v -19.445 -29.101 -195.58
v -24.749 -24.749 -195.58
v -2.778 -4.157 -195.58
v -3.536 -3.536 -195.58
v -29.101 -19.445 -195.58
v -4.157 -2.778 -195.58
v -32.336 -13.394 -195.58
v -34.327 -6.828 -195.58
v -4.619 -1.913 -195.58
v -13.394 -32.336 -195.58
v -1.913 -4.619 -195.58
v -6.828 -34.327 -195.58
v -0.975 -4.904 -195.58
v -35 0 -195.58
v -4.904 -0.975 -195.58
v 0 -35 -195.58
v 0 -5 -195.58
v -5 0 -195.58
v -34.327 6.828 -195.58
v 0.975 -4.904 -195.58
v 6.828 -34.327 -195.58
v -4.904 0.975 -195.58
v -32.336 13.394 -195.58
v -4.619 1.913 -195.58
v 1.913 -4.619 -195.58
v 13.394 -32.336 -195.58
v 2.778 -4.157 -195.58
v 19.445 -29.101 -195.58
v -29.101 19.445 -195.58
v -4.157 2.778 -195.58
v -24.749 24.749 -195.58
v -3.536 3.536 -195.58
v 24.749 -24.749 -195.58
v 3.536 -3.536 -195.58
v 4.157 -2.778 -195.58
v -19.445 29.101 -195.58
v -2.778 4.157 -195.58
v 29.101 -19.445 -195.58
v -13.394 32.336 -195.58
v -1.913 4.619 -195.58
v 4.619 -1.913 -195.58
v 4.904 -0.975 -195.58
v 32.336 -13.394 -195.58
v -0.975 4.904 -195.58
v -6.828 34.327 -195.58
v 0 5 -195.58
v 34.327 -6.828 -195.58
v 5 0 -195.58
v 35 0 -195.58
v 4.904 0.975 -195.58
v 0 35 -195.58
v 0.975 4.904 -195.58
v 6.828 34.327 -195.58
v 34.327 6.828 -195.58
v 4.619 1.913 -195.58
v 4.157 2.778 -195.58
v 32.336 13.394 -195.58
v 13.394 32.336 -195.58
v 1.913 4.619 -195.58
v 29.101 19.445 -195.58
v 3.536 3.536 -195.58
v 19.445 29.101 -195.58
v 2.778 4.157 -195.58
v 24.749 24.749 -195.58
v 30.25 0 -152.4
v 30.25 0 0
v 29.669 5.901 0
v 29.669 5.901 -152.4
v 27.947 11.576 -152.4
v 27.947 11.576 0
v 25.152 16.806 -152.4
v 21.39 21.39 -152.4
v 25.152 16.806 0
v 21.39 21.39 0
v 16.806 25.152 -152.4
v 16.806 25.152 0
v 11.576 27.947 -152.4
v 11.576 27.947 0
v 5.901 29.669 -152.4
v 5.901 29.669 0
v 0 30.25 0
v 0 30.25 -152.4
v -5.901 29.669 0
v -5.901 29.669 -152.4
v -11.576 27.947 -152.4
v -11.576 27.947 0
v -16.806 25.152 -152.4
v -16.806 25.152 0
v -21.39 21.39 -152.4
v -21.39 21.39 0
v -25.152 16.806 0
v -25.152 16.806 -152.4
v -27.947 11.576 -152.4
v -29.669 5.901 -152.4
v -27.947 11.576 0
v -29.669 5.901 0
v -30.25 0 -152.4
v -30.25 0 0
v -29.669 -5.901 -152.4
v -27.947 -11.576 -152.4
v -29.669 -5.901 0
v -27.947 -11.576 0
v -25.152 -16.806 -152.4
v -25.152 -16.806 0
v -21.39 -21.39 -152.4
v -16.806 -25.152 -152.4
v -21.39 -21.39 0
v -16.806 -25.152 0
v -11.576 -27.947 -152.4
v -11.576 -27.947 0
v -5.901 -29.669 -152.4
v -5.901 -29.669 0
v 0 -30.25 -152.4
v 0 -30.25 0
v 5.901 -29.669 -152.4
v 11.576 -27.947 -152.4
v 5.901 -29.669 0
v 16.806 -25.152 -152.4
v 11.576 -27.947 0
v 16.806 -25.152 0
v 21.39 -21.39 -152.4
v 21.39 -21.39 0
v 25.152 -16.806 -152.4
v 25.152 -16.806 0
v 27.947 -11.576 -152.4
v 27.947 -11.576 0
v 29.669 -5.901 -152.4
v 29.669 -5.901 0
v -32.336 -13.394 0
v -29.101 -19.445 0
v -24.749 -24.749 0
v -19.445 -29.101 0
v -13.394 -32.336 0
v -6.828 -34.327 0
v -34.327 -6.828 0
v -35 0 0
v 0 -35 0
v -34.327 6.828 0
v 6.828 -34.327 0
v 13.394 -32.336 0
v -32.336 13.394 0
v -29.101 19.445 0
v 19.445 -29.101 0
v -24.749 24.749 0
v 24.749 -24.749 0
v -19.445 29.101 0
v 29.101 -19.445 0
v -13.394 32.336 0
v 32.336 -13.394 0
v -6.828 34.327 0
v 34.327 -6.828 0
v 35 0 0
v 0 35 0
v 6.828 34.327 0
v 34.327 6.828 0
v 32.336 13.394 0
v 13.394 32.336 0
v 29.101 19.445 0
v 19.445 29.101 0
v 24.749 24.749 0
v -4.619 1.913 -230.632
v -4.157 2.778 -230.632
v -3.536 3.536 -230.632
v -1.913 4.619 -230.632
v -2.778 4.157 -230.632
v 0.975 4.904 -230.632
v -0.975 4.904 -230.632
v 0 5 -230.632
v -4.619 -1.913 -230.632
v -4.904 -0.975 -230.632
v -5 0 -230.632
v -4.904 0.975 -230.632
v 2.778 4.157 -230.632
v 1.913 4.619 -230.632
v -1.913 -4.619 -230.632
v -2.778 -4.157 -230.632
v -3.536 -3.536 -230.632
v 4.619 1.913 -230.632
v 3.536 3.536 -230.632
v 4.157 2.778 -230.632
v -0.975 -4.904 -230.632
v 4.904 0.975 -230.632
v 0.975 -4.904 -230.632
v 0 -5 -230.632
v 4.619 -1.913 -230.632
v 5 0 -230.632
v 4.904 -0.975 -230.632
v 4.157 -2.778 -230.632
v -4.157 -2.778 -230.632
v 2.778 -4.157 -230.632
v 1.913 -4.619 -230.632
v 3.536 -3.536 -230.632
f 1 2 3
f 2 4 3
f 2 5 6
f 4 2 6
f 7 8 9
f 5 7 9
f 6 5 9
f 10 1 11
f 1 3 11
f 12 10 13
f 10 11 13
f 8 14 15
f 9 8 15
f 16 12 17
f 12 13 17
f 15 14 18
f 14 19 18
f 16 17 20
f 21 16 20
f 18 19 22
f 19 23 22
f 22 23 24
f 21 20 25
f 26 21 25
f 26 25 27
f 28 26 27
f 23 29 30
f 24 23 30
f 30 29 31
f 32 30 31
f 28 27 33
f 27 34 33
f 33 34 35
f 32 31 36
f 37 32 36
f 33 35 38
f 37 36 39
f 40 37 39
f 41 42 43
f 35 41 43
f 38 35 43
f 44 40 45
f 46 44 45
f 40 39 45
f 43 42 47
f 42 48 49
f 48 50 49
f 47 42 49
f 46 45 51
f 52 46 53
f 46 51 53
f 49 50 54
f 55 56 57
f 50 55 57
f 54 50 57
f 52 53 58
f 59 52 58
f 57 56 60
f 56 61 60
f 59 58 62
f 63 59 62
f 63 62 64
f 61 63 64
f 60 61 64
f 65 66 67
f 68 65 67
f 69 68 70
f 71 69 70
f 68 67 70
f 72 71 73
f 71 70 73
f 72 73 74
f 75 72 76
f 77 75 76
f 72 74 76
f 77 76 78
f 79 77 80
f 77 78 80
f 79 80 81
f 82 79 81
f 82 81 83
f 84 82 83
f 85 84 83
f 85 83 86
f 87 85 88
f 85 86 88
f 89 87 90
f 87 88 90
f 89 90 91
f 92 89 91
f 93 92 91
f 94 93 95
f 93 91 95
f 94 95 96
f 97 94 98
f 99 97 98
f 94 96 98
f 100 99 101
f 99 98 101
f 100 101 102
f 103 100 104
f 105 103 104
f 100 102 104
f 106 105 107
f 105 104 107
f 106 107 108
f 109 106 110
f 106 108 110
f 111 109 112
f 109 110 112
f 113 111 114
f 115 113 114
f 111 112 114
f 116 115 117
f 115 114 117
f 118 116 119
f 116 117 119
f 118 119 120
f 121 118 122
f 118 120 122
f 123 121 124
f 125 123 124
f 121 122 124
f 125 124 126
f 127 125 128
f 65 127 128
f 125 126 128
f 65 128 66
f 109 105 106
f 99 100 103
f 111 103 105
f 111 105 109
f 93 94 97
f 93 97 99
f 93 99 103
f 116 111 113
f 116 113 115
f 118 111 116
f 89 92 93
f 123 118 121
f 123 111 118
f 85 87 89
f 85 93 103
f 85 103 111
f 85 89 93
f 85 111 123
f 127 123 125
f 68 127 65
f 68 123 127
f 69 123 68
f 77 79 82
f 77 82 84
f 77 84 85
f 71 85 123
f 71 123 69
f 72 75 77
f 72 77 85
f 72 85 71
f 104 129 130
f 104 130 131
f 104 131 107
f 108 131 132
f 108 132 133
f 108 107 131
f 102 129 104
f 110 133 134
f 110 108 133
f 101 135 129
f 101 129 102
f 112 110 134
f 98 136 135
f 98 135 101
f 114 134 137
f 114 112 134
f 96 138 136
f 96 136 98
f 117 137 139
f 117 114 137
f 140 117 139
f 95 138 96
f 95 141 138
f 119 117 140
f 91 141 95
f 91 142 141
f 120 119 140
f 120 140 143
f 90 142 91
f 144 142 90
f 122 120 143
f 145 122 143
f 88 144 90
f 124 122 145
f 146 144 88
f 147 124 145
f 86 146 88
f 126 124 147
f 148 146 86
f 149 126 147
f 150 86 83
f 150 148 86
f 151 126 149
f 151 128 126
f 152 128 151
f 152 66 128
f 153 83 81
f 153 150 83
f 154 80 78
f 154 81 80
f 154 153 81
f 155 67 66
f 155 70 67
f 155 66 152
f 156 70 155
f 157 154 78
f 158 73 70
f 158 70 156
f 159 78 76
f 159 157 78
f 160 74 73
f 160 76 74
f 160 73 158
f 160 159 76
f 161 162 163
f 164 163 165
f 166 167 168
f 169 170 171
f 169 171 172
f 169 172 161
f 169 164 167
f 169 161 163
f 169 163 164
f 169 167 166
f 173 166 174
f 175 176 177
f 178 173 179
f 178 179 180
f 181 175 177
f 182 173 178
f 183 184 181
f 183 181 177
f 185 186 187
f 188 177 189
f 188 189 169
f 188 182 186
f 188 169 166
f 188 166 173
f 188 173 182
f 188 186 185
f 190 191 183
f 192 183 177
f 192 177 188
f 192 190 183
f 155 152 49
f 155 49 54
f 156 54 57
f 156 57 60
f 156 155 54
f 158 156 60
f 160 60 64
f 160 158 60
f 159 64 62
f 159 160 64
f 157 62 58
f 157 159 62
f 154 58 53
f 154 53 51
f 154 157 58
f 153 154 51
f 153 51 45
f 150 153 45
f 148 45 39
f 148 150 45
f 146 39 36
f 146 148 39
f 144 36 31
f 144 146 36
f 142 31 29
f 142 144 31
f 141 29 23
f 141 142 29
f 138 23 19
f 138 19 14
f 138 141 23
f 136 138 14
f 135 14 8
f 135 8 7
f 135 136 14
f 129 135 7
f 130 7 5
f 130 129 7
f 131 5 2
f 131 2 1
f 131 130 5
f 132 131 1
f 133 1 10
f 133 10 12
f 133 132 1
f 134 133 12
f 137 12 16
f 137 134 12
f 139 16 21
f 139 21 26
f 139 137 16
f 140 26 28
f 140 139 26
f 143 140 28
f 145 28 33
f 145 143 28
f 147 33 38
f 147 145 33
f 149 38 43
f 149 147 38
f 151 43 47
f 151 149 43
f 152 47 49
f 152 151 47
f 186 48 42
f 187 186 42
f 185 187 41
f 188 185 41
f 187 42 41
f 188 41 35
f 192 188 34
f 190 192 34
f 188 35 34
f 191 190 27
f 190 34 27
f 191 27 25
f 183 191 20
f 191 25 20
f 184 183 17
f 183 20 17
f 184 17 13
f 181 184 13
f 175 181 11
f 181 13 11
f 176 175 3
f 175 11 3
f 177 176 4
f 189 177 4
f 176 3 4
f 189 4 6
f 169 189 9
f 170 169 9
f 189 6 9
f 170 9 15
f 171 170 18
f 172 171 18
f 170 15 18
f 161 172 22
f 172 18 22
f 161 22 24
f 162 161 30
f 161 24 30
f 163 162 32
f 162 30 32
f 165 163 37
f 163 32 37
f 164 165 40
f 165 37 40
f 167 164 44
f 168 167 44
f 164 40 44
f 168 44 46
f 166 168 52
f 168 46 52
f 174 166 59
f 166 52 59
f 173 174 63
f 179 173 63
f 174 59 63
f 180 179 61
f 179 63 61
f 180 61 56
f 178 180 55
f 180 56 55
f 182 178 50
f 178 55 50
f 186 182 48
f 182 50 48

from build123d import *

# Parameters (mm, degrees)
SKETCH1_R           = 35
BOSS_EXTRUDE1_DEPTH = 195.58
SKETCH2_R           = 5
BOSS_EXTRUDE2_DEPTH = 35.052
SKETCH5_R           = 30.25
CUT_EXTRUDE1_DEPTH  = 152.4


with BuildPart() as part:
    # Sketch1 → Boss-Extrude1 (new body)
    with BuildSketch(Plane.XY):
        Circle(SKETCH1_R)
    extrude(amount=-BOSS_EXTRUDE1_DEPTH)

    # Sketch2 → Boss-Extrude2 (add)
    with BuildSketch(Plane(origin=(0, 0, -195.58), x_dir=(-1, 0, 0), z_dir=(0, 0, -1))):
        with Locations(Location((0, 0, 0), (0, 0, 180))):
            Circle(SKETCH2_R)
    extrude(amount=BOSS_EXTRUDE2_DEPTH)

    # Sketch5 → Cut-Extrude1 (cut)
    with BuildSketch(Plane.XY):
        Circle(SKETCH5_R)
    extrude(amount=-CUT_EXTRUDE1_DEPTH, mode=Mode.SUBTRACT)


solid = part.part
